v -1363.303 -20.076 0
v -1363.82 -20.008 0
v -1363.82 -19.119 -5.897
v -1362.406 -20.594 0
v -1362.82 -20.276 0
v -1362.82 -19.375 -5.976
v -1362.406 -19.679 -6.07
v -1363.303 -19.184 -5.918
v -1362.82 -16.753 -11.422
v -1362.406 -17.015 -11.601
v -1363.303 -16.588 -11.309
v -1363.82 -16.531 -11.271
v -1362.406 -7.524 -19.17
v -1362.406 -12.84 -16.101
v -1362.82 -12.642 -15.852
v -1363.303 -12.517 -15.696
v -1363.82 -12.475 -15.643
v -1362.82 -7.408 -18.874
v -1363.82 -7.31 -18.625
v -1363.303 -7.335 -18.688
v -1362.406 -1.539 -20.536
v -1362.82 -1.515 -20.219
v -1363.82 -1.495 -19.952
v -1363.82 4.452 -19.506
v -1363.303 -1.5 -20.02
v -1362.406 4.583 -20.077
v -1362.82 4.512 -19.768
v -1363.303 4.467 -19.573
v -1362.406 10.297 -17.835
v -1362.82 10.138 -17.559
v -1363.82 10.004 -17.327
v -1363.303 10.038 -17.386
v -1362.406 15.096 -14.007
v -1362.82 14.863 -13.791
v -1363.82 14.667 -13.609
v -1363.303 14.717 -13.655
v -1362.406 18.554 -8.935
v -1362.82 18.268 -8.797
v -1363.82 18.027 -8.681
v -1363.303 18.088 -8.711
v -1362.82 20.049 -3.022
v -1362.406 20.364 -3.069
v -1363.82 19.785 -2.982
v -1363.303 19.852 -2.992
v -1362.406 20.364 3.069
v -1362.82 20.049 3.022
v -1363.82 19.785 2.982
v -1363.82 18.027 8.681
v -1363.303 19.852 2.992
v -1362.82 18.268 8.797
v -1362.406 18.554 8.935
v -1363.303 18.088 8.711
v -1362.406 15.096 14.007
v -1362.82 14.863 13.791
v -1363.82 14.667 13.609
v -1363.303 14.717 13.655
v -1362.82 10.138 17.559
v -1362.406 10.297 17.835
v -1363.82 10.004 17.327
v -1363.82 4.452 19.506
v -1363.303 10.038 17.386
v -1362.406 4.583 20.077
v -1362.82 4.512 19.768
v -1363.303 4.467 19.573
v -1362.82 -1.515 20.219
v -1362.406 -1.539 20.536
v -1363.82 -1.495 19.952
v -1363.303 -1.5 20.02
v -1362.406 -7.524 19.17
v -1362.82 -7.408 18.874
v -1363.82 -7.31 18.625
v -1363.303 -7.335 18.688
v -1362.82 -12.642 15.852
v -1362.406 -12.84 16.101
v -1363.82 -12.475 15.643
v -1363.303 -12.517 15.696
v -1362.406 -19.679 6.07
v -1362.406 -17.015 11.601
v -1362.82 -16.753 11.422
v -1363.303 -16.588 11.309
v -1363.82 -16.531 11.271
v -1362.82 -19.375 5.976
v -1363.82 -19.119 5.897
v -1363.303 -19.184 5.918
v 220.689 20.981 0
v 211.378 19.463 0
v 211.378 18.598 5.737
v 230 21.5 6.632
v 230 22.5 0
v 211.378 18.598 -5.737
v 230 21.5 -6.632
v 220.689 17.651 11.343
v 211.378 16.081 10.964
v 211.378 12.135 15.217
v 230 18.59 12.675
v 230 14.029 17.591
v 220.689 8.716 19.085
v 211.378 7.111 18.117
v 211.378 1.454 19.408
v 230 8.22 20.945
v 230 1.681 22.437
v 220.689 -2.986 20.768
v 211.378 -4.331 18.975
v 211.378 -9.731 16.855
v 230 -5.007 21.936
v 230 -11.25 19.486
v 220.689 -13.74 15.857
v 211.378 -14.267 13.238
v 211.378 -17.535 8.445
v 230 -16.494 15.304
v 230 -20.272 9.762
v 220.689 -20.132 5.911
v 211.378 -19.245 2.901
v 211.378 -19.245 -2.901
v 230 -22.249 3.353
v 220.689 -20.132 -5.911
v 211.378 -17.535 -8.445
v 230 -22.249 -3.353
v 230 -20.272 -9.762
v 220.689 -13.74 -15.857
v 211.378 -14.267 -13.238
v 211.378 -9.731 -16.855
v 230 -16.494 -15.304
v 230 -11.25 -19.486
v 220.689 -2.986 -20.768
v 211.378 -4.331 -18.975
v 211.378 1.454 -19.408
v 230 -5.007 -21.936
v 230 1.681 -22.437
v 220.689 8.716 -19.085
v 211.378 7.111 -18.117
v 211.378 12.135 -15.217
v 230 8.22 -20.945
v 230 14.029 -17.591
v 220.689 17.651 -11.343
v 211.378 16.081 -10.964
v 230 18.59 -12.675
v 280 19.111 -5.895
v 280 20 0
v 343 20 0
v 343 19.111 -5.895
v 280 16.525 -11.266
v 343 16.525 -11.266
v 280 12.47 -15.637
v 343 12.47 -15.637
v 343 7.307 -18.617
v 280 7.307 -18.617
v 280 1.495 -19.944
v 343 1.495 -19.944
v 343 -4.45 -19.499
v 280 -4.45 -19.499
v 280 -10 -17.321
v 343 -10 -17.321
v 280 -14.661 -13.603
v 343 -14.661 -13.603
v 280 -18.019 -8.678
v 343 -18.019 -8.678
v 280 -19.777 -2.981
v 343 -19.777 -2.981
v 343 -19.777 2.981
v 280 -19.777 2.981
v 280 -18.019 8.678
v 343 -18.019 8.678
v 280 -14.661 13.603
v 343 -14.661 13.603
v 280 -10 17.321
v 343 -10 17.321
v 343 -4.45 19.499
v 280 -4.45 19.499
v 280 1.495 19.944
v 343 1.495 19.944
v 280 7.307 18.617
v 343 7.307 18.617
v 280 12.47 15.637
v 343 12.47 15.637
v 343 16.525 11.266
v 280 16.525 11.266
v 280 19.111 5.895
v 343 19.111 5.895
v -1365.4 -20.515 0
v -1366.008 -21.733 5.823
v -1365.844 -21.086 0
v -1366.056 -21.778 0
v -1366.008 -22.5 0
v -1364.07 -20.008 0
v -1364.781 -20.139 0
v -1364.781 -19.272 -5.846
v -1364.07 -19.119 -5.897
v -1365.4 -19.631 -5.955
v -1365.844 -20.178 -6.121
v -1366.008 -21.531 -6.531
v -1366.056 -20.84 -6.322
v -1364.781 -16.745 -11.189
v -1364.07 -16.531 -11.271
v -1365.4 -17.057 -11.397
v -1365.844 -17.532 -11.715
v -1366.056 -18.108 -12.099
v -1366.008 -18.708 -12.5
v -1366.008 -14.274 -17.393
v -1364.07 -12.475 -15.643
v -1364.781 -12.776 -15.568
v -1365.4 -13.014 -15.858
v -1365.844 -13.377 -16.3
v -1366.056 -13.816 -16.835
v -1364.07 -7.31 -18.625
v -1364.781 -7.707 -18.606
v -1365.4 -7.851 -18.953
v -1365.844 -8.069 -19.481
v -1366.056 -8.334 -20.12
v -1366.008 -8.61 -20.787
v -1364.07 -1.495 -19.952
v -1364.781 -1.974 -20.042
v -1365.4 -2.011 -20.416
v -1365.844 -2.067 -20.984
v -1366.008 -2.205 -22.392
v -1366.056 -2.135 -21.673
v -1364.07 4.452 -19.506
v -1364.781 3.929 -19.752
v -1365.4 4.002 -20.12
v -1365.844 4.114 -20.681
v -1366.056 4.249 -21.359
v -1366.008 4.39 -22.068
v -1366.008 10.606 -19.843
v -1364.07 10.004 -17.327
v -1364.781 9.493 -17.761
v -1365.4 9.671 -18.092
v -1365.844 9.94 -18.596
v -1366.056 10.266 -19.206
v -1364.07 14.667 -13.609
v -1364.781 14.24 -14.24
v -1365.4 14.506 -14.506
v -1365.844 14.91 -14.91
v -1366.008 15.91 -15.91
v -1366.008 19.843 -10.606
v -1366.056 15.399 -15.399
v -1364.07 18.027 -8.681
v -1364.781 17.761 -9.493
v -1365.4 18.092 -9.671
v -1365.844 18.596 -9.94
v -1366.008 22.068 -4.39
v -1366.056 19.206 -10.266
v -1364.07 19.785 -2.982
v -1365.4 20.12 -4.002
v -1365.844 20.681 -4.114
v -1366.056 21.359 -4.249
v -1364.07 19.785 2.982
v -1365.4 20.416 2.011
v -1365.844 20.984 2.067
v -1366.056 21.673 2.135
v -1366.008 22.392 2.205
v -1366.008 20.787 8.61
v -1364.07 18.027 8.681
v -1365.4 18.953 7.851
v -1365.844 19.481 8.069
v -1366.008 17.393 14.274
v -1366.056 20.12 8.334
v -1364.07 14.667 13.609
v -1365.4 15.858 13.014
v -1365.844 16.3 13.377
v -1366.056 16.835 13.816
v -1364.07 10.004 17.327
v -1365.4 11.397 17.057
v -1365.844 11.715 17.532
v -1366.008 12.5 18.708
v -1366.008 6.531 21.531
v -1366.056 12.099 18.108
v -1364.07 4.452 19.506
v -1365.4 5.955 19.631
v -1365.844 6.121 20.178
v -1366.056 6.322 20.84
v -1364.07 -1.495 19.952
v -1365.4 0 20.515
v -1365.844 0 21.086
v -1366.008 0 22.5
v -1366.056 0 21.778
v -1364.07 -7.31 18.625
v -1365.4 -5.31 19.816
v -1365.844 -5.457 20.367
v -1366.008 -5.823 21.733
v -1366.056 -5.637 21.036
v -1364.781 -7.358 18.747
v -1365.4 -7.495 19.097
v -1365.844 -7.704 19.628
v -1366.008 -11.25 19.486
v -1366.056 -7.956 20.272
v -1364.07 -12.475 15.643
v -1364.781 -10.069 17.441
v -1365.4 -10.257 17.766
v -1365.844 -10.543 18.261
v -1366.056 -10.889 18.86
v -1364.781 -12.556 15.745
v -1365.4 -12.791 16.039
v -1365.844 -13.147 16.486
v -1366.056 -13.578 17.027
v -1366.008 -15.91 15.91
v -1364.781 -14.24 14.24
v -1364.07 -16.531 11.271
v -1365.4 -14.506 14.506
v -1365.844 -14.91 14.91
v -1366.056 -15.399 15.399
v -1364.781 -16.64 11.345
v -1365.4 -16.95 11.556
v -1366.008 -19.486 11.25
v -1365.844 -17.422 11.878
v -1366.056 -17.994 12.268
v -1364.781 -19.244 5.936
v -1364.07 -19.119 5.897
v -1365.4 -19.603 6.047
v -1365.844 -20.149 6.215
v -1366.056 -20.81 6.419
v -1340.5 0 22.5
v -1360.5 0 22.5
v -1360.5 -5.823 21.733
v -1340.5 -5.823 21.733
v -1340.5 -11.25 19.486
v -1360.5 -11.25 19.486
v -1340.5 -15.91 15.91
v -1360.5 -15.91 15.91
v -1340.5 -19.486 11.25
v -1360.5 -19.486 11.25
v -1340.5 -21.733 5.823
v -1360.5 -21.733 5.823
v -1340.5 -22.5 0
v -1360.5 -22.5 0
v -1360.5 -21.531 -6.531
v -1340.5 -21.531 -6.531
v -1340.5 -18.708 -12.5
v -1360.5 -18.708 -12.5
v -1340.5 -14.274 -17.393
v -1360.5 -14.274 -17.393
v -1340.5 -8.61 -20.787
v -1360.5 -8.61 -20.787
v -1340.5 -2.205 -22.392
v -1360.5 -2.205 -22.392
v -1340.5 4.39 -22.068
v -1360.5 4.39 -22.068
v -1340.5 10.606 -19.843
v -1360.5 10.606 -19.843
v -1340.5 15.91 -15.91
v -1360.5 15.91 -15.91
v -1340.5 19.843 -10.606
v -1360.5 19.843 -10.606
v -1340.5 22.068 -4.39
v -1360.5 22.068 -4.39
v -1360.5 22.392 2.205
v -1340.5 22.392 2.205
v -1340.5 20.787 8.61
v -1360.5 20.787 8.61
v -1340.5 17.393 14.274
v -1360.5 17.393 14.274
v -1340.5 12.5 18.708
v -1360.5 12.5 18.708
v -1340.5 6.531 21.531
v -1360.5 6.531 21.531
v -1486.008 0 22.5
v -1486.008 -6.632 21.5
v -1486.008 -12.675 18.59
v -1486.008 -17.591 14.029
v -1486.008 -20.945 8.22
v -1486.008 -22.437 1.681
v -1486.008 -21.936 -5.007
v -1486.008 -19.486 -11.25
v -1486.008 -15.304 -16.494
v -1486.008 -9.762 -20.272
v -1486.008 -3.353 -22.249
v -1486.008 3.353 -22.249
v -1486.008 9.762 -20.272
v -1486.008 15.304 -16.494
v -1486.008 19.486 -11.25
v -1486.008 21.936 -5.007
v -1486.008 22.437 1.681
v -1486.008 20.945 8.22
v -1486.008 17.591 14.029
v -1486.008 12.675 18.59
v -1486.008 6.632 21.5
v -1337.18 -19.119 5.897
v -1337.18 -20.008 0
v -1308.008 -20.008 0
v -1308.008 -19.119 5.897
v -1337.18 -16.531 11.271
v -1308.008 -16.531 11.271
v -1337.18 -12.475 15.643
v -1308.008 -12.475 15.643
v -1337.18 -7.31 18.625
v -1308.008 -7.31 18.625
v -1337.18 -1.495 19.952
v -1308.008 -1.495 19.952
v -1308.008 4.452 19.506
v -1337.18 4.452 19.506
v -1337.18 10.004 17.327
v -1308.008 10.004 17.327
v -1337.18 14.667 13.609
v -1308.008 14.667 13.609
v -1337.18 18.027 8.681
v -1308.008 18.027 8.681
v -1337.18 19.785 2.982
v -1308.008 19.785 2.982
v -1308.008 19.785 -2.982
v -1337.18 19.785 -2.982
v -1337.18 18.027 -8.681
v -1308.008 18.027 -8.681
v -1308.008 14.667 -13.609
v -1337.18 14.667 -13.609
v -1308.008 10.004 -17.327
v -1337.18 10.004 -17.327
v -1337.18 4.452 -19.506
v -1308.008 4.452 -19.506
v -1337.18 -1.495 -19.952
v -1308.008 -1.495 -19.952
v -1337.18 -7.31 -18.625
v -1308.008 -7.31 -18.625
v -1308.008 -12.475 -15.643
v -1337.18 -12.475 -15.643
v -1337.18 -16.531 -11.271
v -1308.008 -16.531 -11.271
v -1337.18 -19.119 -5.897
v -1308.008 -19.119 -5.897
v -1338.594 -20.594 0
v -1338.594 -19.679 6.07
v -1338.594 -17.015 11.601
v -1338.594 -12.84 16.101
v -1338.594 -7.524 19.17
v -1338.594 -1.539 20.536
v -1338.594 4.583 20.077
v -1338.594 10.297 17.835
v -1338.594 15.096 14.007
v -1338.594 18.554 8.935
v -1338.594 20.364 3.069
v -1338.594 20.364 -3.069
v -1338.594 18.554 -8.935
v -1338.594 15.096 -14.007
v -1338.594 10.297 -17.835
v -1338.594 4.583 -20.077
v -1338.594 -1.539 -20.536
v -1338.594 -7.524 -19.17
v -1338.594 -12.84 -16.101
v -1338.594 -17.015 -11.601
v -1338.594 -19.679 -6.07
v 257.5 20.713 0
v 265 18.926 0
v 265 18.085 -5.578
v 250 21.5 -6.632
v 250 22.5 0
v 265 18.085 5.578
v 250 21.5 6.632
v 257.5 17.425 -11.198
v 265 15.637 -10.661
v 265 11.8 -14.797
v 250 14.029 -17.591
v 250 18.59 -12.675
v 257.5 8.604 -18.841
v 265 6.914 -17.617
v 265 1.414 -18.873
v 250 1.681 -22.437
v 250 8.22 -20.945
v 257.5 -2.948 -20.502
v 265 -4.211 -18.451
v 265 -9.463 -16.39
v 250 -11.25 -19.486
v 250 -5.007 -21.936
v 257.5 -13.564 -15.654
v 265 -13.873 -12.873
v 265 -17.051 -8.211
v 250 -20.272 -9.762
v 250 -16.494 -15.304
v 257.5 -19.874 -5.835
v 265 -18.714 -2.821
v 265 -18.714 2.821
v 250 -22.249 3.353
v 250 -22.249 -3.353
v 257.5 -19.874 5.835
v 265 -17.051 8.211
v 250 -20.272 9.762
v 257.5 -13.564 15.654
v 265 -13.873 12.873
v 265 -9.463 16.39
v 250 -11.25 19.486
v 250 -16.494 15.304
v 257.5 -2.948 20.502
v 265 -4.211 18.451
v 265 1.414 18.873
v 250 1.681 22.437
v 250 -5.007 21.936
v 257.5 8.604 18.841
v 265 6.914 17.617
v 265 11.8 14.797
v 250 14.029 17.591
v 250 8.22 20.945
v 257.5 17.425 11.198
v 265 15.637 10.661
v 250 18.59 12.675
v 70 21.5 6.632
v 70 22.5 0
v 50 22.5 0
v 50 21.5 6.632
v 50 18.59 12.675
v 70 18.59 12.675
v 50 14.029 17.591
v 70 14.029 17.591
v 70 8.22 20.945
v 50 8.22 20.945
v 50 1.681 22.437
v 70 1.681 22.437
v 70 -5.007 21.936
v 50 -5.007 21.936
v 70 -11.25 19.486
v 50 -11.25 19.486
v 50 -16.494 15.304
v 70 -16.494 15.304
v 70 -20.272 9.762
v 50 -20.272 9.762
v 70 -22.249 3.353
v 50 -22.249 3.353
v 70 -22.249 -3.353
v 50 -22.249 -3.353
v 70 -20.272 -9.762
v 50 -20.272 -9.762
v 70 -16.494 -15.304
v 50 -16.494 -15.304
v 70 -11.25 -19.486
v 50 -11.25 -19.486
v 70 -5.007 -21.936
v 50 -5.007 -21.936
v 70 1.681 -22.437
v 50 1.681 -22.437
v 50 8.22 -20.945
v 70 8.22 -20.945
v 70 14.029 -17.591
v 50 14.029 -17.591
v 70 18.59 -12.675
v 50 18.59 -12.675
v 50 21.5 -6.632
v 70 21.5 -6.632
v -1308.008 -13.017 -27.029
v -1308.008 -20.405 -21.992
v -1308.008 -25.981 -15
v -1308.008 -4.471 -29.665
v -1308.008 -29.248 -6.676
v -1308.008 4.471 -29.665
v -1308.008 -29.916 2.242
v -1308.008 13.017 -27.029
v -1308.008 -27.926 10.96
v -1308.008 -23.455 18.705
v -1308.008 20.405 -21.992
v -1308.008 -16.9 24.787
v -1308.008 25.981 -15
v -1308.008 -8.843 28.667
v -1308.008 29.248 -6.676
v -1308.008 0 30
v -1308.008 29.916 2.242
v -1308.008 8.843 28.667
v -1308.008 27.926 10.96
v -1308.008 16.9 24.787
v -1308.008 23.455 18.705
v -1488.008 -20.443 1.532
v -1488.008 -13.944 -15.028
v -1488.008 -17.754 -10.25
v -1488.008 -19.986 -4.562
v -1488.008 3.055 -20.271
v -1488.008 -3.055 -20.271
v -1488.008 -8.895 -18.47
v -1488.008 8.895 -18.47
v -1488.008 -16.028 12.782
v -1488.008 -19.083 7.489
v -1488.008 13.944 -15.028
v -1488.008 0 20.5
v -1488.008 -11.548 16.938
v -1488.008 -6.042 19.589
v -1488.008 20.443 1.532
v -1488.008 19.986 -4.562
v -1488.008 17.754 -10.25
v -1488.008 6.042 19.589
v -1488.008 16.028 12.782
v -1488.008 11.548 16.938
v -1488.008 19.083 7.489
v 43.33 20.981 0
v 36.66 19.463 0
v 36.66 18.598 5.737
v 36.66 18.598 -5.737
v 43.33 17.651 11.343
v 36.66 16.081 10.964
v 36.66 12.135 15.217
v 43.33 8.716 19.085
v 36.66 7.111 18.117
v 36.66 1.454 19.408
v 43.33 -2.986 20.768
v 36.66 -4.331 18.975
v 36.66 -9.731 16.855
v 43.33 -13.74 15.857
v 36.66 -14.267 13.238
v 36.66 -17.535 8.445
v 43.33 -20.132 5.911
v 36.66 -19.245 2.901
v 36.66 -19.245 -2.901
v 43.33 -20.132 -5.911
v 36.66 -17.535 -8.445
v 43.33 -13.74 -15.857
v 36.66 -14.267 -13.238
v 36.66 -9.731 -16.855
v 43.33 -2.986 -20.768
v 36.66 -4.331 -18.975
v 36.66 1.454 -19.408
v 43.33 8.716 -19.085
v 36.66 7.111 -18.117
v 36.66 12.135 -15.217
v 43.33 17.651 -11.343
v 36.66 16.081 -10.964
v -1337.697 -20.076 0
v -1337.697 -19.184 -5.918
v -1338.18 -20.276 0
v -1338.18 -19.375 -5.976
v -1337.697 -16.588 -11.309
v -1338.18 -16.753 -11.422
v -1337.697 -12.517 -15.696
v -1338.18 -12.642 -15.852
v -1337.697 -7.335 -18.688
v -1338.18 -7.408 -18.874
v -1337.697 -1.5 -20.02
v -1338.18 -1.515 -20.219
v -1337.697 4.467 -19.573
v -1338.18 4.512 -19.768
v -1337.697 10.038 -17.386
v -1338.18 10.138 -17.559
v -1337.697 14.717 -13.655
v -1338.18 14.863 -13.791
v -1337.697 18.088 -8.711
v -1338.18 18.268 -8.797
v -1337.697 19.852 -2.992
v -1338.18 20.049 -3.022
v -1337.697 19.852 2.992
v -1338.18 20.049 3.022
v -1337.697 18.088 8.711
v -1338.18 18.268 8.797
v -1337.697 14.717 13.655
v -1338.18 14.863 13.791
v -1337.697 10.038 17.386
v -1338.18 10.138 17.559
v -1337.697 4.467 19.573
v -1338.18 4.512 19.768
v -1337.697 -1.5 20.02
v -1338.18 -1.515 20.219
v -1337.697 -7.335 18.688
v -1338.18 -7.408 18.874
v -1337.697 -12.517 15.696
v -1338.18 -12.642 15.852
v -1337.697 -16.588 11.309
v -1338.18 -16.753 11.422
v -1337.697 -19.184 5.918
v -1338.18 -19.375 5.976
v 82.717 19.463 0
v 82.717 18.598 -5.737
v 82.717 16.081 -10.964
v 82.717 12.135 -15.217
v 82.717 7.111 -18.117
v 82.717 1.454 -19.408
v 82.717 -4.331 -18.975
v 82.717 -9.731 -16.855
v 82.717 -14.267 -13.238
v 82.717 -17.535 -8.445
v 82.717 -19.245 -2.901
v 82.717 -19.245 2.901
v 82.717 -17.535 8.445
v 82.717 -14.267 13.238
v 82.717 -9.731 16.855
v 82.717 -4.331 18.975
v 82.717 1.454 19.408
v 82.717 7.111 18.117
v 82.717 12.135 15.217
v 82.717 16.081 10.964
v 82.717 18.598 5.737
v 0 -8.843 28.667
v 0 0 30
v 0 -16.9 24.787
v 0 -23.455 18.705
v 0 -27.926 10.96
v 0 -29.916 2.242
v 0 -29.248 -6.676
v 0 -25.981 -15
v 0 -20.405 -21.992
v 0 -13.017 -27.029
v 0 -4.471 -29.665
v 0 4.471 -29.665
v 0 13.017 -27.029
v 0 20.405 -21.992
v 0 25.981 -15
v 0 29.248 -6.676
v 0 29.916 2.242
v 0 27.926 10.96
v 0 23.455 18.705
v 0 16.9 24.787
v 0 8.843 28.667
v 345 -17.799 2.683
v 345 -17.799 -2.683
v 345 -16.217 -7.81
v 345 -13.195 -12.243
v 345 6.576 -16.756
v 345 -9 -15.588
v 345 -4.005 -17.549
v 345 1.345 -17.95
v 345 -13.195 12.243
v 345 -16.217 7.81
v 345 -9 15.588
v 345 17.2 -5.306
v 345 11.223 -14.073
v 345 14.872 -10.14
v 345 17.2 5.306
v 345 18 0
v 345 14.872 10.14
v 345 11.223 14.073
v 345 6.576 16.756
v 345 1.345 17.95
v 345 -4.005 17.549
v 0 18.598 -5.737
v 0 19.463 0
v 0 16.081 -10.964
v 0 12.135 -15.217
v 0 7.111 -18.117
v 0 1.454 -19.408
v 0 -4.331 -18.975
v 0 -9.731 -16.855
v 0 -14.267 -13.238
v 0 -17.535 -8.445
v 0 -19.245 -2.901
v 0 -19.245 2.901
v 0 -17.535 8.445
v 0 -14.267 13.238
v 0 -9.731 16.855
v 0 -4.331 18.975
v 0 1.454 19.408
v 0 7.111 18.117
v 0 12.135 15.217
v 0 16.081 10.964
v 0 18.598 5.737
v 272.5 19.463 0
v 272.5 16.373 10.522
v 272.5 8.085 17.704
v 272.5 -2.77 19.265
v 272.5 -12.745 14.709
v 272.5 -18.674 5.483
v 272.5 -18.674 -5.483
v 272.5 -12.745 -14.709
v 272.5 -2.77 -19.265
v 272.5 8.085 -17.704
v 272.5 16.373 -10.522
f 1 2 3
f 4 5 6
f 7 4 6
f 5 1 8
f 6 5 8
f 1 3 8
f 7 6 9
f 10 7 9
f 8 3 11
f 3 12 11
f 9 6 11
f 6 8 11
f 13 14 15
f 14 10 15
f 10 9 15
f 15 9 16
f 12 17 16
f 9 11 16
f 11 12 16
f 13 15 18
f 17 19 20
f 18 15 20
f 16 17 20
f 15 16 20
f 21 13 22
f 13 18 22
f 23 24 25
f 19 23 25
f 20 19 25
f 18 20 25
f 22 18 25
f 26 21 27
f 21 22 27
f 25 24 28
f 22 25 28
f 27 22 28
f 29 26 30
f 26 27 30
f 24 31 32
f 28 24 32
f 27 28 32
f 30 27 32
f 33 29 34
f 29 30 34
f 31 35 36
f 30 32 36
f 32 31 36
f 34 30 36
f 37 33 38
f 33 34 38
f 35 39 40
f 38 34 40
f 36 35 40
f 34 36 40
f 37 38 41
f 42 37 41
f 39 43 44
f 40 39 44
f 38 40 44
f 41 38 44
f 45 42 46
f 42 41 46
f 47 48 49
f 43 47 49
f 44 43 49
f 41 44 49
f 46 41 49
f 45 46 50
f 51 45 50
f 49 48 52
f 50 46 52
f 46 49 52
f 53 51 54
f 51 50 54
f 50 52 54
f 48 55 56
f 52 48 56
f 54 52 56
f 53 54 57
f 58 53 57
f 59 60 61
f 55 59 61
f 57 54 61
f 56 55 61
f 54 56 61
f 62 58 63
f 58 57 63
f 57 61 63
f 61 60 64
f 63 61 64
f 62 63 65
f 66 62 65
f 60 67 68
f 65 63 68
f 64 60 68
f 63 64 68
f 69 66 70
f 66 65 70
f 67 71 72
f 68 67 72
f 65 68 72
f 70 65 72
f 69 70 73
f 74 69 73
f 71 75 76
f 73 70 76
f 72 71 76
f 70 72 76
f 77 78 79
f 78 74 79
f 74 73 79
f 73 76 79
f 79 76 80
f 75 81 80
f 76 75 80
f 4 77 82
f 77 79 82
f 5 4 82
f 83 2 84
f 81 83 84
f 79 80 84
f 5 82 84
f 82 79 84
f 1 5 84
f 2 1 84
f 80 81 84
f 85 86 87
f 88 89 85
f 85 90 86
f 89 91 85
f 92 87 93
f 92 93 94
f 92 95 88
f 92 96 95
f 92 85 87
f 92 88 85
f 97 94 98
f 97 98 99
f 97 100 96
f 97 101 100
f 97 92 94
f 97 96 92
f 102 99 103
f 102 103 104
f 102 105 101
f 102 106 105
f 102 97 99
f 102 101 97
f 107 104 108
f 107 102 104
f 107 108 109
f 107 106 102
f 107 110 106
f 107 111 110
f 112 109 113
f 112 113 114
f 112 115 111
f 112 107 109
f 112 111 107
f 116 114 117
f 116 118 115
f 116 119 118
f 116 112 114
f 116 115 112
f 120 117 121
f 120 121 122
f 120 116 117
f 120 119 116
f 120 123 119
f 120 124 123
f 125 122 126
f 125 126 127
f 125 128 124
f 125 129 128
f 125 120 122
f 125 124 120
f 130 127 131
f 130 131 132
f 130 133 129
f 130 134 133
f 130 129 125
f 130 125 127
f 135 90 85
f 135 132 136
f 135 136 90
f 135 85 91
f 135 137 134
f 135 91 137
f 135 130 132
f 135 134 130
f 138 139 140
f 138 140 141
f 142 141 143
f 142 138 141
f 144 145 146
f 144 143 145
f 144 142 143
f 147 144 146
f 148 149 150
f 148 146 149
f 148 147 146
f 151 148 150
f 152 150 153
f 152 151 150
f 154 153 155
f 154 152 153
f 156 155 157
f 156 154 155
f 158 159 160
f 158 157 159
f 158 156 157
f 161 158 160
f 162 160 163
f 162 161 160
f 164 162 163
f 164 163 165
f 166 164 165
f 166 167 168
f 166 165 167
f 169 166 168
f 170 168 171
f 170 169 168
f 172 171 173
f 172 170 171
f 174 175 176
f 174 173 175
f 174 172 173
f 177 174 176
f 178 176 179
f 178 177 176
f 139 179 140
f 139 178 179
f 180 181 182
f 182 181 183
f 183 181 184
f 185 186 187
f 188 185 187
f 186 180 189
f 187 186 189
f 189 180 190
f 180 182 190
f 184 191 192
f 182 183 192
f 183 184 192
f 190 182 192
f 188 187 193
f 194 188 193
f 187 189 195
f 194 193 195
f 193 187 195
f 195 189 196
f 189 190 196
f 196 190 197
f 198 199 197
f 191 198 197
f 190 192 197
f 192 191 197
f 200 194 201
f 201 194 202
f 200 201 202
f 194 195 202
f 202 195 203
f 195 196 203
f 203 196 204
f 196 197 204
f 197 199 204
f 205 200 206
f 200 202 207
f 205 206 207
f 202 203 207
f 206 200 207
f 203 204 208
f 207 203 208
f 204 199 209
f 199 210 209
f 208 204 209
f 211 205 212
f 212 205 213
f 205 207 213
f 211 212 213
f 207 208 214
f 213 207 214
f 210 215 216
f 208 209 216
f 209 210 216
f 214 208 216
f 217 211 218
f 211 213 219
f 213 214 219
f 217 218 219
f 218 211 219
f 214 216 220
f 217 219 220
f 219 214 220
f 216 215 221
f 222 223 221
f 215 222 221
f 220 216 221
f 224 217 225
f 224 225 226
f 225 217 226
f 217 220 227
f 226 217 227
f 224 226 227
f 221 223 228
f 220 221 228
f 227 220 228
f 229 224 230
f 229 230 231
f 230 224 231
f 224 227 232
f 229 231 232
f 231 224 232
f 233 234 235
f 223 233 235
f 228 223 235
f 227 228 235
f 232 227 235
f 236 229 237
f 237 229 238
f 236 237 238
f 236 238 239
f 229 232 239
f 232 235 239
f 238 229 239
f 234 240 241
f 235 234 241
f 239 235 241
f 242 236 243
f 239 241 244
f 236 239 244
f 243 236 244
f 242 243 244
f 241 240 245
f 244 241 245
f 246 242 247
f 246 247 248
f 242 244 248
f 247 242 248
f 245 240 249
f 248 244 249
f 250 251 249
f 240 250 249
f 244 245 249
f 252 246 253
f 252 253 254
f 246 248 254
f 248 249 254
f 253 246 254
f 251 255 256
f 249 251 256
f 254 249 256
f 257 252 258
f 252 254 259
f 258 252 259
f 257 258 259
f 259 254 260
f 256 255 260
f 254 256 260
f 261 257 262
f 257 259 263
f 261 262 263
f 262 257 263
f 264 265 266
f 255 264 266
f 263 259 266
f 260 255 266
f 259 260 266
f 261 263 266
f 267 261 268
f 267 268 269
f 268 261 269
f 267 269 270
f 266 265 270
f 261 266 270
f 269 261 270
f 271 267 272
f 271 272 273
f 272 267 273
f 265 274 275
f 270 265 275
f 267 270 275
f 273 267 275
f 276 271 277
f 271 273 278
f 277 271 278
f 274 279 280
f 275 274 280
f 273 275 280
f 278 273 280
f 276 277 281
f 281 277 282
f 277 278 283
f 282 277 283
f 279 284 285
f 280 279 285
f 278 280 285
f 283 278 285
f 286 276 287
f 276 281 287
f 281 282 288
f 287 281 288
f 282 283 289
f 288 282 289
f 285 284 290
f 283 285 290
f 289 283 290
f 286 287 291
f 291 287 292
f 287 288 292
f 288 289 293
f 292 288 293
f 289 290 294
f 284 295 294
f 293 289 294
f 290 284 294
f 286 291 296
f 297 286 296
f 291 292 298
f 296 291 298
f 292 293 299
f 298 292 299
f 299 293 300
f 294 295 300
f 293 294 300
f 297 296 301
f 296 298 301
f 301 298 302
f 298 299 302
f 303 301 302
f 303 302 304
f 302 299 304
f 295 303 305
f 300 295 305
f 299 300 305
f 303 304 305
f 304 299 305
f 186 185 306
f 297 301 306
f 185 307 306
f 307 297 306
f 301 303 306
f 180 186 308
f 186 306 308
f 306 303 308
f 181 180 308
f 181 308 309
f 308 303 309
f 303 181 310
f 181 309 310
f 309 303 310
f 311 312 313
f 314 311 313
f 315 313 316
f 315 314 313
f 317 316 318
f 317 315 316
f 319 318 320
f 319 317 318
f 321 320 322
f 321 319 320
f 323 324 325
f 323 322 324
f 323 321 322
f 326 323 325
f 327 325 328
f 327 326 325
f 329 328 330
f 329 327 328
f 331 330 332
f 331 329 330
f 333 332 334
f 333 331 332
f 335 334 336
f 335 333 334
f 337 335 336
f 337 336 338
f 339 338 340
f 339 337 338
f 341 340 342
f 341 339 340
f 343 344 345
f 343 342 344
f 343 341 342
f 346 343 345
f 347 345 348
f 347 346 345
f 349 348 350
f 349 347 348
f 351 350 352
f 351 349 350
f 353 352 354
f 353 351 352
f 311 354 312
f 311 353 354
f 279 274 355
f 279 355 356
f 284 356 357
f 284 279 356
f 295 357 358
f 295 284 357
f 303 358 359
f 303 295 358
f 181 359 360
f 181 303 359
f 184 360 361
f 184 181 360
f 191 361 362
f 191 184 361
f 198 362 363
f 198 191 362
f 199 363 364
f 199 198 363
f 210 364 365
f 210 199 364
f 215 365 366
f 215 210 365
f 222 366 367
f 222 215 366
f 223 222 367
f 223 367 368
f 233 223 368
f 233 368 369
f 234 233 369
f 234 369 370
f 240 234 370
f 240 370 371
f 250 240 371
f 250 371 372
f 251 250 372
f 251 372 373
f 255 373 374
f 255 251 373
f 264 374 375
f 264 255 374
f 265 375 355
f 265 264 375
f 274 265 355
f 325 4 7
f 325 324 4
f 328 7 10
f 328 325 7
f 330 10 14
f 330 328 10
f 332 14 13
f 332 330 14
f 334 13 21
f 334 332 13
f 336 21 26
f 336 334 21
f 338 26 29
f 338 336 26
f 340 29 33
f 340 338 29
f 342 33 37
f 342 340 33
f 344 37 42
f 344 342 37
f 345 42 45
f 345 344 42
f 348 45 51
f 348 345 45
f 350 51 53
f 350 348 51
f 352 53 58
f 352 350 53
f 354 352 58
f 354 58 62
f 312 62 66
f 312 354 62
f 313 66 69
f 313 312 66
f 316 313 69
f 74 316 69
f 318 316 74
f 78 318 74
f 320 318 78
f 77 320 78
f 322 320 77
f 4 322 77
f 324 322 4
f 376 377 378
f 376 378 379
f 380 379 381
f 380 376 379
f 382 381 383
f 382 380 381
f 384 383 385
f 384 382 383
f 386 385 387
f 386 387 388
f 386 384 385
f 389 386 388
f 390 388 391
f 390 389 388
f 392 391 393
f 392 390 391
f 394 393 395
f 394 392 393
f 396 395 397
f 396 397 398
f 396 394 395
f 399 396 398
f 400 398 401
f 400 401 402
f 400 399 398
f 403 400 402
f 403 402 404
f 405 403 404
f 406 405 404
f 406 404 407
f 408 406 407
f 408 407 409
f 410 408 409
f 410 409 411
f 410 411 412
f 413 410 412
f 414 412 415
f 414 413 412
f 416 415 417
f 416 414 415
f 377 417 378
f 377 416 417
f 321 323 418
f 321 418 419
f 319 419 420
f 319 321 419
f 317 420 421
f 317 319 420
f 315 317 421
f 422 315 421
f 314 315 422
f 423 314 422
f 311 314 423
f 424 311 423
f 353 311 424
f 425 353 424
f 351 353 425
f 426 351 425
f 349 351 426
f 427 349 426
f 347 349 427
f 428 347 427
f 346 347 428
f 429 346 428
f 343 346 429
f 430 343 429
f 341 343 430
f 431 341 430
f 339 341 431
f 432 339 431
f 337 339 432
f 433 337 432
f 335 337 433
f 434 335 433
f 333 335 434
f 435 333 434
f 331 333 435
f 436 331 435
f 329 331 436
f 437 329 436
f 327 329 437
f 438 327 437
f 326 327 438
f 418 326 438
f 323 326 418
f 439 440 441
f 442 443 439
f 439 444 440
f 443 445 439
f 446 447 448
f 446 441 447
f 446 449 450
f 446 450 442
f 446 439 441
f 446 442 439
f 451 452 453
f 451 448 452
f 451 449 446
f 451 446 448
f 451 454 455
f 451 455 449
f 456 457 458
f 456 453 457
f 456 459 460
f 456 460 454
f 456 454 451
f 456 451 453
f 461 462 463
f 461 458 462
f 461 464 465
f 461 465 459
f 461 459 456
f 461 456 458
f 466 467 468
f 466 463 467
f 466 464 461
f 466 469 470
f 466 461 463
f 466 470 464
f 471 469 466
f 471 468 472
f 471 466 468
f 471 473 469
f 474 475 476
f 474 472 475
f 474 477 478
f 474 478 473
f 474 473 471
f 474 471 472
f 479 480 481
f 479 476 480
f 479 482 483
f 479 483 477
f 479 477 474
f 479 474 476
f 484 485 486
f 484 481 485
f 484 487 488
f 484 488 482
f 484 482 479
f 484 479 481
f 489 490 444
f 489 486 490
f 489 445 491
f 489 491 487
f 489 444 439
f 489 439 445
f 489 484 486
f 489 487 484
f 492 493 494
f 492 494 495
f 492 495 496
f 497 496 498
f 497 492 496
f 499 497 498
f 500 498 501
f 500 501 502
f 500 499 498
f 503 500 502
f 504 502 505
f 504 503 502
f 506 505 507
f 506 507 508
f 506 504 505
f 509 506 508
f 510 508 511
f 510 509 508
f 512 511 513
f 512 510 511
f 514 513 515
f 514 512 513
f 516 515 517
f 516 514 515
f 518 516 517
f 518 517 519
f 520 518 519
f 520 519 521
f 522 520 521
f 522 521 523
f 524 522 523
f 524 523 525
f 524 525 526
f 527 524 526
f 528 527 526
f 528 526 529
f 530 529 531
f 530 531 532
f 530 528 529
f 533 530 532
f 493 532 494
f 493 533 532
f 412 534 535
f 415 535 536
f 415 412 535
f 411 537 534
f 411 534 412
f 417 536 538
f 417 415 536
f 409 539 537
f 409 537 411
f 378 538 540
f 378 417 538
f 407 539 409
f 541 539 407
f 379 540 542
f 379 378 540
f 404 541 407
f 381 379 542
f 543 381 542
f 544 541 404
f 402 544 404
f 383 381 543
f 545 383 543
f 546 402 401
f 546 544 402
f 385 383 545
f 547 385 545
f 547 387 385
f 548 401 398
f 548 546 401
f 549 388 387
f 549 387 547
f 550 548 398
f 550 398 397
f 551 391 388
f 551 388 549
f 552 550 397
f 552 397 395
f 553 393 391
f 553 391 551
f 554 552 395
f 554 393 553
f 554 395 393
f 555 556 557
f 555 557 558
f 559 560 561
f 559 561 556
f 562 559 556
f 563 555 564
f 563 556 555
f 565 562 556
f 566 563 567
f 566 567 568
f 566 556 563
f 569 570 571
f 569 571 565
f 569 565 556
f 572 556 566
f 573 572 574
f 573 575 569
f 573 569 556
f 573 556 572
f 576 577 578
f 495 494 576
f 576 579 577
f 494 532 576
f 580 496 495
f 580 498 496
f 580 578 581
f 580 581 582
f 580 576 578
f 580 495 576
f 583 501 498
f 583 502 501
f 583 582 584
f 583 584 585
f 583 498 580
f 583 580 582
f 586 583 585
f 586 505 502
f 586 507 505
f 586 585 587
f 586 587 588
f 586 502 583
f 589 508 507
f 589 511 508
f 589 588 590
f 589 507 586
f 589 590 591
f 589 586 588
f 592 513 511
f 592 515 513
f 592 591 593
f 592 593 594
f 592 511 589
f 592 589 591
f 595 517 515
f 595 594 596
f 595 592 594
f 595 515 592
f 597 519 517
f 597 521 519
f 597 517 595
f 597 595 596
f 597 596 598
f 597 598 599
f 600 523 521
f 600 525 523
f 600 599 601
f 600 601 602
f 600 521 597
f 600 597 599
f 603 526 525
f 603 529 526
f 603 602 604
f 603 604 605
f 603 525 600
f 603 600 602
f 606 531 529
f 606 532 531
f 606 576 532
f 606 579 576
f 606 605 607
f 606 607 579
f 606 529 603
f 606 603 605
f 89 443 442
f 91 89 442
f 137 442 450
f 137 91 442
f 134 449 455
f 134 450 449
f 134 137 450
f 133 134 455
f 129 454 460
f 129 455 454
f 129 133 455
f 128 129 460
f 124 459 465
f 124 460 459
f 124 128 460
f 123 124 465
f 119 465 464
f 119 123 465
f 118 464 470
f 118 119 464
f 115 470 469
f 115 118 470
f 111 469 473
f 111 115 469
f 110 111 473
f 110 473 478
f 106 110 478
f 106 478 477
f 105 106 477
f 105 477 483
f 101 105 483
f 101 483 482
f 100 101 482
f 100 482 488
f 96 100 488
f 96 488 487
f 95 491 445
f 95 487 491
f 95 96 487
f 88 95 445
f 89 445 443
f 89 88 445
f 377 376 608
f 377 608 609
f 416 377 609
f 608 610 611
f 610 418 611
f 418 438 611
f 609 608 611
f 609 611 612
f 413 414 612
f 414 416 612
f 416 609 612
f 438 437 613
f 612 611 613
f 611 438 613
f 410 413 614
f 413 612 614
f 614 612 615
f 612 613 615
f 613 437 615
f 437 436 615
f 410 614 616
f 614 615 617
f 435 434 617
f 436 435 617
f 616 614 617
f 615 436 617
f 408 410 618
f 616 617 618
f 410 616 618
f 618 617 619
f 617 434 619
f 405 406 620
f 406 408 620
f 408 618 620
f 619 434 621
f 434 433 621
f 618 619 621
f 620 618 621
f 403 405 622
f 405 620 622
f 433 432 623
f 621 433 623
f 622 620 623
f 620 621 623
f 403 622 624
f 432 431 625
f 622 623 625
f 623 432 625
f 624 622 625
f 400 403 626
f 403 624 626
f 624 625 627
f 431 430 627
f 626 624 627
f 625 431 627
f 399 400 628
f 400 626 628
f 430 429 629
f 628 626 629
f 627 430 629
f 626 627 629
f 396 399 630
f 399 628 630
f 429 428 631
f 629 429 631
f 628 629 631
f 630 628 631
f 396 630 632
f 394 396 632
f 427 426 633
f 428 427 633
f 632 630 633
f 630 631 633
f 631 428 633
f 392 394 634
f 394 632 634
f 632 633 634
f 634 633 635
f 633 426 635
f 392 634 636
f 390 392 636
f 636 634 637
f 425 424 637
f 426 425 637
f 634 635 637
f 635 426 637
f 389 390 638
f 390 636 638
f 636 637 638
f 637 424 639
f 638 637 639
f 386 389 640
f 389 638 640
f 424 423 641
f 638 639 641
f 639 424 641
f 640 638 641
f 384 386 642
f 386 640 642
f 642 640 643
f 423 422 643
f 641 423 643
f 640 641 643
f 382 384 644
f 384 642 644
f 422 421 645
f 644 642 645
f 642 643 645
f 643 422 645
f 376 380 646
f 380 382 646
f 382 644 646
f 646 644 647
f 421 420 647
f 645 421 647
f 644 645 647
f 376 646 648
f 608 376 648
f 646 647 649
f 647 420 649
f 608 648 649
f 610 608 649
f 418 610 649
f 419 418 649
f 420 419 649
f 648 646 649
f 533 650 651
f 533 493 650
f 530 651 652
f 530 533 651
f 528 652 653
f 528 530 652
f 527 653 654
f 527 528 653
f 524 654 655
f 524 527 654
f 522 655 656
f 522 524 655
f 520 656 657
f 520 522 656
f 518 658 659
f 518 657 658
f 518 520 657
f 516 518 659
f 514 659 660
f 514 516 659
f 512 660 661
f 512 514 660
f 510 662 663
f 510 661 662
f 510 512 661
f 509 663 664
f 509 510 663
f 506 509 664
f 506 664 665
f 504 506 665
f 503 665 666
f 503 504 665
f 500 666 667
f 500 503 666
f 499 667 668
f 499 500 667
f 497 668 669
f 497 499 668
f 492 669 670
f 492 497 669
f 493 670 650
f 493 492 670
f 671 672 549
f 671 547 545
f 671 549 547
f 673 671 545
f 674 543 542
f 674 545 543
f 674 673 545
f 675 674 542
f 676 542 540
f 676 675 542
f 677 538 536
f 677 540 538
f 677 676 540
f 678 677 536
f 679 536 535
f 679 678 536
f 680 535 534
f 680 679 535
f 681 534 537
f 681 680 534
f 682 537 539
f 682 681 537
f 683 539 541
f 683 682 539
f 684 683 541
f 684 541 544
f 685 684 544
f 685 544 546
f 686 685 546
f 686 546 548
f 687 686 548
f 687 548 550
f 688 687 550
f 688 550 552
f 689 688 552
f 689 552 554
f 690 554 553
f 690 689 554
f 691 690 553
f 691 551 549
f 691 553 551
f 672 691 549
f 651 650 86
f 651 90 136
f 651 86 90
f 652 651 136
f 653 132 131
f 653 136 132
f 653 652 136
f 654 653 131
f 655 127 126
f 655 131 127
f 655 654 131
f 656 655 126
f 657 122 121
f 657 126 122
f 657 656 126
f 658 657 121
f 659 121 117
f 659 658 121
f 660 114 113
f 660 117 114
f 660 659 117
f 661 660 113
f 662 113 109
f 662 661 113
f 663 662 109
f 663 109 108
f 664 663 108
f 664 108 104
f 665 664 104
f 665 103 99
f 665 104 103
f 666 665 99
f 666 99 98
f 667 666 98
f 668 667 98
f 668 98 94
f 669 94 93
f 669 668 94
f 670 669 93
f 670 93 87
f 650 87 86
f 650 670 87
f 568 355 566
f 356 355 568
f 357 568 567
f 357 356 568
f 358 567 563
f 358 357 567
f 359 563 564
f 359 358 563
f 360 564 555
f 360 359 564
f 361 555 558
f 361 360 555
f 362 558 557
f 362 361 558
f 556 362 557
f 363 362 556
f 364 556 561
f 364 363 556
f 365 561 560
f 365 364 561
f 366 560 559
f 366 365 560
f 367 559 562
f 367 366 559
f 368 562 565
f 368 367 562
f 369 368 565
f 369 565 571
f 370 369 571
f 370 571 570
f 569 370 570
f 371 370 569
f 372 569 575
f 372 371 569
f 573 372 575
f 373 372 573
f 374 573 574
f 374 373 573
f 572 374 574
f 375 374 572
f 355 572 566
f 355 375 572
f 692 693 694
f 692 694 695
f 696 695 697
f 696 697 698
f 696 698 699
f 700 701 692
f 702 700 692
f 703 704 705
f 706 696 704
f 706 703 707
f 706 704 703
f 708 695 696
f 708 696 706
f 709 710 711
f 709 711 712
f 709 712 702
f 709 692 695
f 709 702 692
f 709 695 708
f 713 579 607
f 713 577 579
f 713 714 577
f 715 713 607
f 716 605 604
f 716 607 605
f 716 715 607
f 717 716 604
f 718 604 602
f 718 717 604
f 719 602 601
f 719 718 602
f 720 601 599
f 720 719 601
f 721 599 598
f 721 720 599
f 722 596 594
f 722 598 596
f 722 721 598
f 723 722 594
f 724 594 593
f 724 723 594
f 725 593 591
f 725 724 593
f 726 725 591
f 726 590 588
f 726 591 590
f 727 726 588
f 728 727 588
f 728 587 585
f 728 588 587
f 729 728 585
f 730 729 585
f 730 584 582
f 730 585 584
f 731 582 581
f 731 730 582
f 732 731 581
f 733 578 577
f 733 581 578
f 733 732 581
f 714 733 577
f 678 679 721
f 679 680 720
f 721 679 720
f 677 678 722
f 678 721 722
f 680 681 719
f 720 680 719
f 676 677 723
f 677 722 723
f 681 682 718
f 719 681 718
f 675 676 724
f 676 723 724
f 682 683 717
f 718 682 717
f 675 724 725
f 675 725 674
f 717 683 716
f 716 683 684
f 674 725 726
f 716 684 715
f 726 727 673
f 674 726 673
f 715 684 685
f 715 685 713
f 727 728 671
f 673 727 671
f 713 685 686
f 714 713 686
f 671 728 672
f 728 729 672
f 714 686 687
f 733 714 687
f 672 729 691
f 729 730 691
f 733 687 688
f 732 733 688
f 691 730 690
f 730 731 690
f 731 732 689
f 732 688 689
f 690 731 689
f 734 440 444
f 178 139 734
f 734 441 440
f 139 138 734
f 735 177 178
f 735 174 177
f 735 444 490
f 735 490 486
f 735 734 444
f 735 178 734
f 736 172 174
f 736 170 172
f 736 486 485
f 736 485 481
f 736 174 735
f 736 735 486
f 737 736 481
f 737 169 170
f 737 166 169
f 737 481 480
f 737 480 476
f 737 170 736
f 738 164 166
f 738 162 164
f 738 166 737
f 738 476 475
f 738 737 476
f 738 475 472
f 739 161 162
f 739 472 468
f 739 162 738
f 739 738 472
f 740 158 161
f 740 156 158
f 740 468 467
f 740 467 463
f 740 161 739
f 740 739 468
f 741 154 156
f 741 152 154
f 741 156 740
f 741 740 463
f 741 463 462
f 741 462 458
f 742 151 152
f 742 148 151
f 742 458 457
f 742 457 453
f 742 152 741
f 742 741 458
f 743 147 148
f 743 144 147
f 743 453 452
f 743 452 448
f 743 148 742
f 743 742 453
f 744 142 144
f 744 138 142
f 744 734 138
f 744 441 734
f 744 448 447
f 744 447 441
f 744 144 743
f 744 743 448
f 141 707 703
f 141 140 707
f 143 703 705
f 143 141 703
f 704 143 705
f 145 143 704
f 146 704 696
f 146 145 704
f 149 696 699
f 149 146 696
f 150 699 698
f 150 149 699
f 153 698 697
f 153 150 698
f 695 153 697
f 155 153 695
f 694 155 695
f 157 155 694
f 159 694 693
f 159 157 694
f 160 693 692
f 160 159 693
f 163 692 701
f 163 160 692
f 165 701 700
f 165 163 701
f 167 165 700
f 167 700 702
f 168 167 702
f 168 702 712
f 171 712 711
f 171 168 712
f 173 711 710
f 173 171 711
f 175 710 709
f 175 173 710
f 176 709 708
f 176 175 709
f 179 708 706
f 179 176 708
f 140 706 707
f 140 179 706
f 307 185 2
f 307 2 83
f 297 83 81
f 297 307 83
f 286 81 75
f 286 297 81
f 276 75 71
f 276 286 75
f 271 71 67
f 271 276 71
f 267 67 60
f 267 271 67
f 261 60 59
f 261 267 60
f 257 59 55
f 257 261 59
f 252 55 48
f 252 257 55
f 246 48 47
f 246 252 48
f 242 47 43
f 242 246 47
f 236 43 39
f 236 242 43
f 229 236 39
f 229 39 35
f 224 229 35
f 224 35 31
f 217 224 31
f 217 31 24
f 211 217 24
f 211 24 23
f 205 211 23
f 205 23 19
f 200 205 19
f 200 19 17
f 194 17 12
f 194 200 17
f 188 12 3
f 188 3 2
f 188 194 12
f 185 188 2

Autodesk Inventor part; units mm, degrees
ref_plane "YZ Plane" through (0, 0, 0) normal (1, 0, 0) x (0, 1, 0)
ref_plane "XZ Plane" through (0, 0, 0) normal (0, 1, 0) x (-1, 0, 0)
ref_plane "XY Plane" through (0, 0, 0) normal (0, 0, 1) x (1, 0, 0)
sketch "Эскиз1" plane through (0, 0, 0) normal (0, 0, 1) x (1, 0, 0)
  line L0 (0, 0) -> (345, 0)
  line L1 (345, 0) -> (345, 20)
  line L2 (345, 20) -> (280, 20)
  line L3 (0, 0) -> (0, 22.5)
  line L4 (0, 22.5) -> (50, 22.5)
  line L5 (50, 22.5) -> (70, 22.5)
  line L6 (250, 22.5) -> (230, 22.5)
  line L7 (250, 22.5) -> (265, 18.9255)
  line L8 (265, 18.9255) -> (280, 20)
  line L9 (82.7171, 19.4628) -> (70, 22.5)
  line L10 (50, 22.5) -> (36.6597, 19.4628)
  line L11 (36.6597, 19.4628) -> (0, 19.4628)
  line L12 (230, 22.5) -> (211.3782, 19.4628)
  line L13 (211.3782, 19.4628) -> (82.7171, 19.4628)
  dimension "d0" = 345
  dimension "d1" = 20
  dimension "d2" = 65
  dimension "d5" = 22.5
  dimension "d6" = 50
  dimension "d7" = 20
  dimension "d8" = 20
  dimension "d15" = 30
revolve "Вращение1" add sketch "Эскиз1" angle 360 about axis through (0, 0, 0) along (1, 0, 0) contours L3 L11 L10 L5 L9 L13 L12 L6 L7 L8 L2 L1 L0
thread "Резьба1" size "M40x3" class "6g" standard "ANSI Metric M Profile" full length
sketch "Эскиз2" plane through (0, 0, 0) normal (-1, 0, 0) x (0, 0, 1)
  circle A0 centre (0, 0) radius 30
  dimension "d12" = 60
extrude "Выдавливание1" add sketch "Эскиз2" along normal blind 1308.008
sketch "Эскиз3" plane through (-1308.008, 0, 0) normal (-1, 0, 0) x (0, 0, 1)
  circle A0 centre (0, 0) radius 22.5
  dimension "d16" = 45
extrude "Выдавливание2" add sketch "Эскиз3" along normal blind 180
sketch "Эскиз4" plane through (0, 0, 0) normal (0, 0, 1) x (1, 0, 0)
  line L0 (-1308.008, 30) -> (-1308.008, -30) projected
  line L1 (-1488.008, 22.5) -> (-1488.008, -22.5) projected
  line L2 (-1308.008, -22.5) -> (-1308.008, 22.5) projected
  line L3 (-1308.008, 0) -> (-1308.008, 20)
  line L4 (-1308.008, 22.5) -> (-1308.008, 20)
  line L5 (-1308.008, 0) -> (-1308.008, -20.008)
  line L6 (-1308.008, -20.008) -> (-1338.008, -20.008)
  line L7 (-1338.008, -20.008) -> (-1340.5, -22.5)
  line L8 (-1340.5, -22.5) -> (-1360.5, -22.5)
  line L9 (-1308.008, -22.5) -> (-1488.008, -22.5) projected
  line L10 (-1360.5, -22.5) -> (-1362.992, -20.008)
  line L11 (-1366.0081, 27.5) -> (-1366.0081, -27.5) projected
  line L12 (-1362.992, -20.008) -> (-1388.5, -20.008)
  line L13 (-1388.5, -20.008) -> (-1366.0081, -22.5)
  line L14 (-1308.008, -22.5) -> (-1488.008, -22.5) projected
  line L15 (-1383, 0) -> (-1400.8637, 0)
  point P0 (-1340.5, -22.5)
  point P1 (-1308.008, -20.008)
  point P2 (-1348.9963, -21.5037)
  dimension "d31" = 30
  dimension "d32" = 135
  dimension "d33" = 20
  dimension "d34" = 135
revolve "Вращение2" cut sketch "Эскиз4" angle 360 about axis through (-1383, 0, 0) along (-1, 0, 0)
chamfer "Фаска1" distance 2 angle 45 1 edges at (-1488.008, 0, -22.5)
thread "Резьба2" size "M45x4.5" class "6g" standard "ANSI Metric M Profile" full length
chamfer "Фаска2" distance 2 angle 45 1 edges at (345, -20, 0)
fillet "Сопряжение2" radius 2 3 edges at (-1338.008, 20.008, 0) (-1362.992, 20.008, 0) (-1388.5, 20.008, 0)
properties part number "Шток_CPY" material "Сталь, углеродистая"
